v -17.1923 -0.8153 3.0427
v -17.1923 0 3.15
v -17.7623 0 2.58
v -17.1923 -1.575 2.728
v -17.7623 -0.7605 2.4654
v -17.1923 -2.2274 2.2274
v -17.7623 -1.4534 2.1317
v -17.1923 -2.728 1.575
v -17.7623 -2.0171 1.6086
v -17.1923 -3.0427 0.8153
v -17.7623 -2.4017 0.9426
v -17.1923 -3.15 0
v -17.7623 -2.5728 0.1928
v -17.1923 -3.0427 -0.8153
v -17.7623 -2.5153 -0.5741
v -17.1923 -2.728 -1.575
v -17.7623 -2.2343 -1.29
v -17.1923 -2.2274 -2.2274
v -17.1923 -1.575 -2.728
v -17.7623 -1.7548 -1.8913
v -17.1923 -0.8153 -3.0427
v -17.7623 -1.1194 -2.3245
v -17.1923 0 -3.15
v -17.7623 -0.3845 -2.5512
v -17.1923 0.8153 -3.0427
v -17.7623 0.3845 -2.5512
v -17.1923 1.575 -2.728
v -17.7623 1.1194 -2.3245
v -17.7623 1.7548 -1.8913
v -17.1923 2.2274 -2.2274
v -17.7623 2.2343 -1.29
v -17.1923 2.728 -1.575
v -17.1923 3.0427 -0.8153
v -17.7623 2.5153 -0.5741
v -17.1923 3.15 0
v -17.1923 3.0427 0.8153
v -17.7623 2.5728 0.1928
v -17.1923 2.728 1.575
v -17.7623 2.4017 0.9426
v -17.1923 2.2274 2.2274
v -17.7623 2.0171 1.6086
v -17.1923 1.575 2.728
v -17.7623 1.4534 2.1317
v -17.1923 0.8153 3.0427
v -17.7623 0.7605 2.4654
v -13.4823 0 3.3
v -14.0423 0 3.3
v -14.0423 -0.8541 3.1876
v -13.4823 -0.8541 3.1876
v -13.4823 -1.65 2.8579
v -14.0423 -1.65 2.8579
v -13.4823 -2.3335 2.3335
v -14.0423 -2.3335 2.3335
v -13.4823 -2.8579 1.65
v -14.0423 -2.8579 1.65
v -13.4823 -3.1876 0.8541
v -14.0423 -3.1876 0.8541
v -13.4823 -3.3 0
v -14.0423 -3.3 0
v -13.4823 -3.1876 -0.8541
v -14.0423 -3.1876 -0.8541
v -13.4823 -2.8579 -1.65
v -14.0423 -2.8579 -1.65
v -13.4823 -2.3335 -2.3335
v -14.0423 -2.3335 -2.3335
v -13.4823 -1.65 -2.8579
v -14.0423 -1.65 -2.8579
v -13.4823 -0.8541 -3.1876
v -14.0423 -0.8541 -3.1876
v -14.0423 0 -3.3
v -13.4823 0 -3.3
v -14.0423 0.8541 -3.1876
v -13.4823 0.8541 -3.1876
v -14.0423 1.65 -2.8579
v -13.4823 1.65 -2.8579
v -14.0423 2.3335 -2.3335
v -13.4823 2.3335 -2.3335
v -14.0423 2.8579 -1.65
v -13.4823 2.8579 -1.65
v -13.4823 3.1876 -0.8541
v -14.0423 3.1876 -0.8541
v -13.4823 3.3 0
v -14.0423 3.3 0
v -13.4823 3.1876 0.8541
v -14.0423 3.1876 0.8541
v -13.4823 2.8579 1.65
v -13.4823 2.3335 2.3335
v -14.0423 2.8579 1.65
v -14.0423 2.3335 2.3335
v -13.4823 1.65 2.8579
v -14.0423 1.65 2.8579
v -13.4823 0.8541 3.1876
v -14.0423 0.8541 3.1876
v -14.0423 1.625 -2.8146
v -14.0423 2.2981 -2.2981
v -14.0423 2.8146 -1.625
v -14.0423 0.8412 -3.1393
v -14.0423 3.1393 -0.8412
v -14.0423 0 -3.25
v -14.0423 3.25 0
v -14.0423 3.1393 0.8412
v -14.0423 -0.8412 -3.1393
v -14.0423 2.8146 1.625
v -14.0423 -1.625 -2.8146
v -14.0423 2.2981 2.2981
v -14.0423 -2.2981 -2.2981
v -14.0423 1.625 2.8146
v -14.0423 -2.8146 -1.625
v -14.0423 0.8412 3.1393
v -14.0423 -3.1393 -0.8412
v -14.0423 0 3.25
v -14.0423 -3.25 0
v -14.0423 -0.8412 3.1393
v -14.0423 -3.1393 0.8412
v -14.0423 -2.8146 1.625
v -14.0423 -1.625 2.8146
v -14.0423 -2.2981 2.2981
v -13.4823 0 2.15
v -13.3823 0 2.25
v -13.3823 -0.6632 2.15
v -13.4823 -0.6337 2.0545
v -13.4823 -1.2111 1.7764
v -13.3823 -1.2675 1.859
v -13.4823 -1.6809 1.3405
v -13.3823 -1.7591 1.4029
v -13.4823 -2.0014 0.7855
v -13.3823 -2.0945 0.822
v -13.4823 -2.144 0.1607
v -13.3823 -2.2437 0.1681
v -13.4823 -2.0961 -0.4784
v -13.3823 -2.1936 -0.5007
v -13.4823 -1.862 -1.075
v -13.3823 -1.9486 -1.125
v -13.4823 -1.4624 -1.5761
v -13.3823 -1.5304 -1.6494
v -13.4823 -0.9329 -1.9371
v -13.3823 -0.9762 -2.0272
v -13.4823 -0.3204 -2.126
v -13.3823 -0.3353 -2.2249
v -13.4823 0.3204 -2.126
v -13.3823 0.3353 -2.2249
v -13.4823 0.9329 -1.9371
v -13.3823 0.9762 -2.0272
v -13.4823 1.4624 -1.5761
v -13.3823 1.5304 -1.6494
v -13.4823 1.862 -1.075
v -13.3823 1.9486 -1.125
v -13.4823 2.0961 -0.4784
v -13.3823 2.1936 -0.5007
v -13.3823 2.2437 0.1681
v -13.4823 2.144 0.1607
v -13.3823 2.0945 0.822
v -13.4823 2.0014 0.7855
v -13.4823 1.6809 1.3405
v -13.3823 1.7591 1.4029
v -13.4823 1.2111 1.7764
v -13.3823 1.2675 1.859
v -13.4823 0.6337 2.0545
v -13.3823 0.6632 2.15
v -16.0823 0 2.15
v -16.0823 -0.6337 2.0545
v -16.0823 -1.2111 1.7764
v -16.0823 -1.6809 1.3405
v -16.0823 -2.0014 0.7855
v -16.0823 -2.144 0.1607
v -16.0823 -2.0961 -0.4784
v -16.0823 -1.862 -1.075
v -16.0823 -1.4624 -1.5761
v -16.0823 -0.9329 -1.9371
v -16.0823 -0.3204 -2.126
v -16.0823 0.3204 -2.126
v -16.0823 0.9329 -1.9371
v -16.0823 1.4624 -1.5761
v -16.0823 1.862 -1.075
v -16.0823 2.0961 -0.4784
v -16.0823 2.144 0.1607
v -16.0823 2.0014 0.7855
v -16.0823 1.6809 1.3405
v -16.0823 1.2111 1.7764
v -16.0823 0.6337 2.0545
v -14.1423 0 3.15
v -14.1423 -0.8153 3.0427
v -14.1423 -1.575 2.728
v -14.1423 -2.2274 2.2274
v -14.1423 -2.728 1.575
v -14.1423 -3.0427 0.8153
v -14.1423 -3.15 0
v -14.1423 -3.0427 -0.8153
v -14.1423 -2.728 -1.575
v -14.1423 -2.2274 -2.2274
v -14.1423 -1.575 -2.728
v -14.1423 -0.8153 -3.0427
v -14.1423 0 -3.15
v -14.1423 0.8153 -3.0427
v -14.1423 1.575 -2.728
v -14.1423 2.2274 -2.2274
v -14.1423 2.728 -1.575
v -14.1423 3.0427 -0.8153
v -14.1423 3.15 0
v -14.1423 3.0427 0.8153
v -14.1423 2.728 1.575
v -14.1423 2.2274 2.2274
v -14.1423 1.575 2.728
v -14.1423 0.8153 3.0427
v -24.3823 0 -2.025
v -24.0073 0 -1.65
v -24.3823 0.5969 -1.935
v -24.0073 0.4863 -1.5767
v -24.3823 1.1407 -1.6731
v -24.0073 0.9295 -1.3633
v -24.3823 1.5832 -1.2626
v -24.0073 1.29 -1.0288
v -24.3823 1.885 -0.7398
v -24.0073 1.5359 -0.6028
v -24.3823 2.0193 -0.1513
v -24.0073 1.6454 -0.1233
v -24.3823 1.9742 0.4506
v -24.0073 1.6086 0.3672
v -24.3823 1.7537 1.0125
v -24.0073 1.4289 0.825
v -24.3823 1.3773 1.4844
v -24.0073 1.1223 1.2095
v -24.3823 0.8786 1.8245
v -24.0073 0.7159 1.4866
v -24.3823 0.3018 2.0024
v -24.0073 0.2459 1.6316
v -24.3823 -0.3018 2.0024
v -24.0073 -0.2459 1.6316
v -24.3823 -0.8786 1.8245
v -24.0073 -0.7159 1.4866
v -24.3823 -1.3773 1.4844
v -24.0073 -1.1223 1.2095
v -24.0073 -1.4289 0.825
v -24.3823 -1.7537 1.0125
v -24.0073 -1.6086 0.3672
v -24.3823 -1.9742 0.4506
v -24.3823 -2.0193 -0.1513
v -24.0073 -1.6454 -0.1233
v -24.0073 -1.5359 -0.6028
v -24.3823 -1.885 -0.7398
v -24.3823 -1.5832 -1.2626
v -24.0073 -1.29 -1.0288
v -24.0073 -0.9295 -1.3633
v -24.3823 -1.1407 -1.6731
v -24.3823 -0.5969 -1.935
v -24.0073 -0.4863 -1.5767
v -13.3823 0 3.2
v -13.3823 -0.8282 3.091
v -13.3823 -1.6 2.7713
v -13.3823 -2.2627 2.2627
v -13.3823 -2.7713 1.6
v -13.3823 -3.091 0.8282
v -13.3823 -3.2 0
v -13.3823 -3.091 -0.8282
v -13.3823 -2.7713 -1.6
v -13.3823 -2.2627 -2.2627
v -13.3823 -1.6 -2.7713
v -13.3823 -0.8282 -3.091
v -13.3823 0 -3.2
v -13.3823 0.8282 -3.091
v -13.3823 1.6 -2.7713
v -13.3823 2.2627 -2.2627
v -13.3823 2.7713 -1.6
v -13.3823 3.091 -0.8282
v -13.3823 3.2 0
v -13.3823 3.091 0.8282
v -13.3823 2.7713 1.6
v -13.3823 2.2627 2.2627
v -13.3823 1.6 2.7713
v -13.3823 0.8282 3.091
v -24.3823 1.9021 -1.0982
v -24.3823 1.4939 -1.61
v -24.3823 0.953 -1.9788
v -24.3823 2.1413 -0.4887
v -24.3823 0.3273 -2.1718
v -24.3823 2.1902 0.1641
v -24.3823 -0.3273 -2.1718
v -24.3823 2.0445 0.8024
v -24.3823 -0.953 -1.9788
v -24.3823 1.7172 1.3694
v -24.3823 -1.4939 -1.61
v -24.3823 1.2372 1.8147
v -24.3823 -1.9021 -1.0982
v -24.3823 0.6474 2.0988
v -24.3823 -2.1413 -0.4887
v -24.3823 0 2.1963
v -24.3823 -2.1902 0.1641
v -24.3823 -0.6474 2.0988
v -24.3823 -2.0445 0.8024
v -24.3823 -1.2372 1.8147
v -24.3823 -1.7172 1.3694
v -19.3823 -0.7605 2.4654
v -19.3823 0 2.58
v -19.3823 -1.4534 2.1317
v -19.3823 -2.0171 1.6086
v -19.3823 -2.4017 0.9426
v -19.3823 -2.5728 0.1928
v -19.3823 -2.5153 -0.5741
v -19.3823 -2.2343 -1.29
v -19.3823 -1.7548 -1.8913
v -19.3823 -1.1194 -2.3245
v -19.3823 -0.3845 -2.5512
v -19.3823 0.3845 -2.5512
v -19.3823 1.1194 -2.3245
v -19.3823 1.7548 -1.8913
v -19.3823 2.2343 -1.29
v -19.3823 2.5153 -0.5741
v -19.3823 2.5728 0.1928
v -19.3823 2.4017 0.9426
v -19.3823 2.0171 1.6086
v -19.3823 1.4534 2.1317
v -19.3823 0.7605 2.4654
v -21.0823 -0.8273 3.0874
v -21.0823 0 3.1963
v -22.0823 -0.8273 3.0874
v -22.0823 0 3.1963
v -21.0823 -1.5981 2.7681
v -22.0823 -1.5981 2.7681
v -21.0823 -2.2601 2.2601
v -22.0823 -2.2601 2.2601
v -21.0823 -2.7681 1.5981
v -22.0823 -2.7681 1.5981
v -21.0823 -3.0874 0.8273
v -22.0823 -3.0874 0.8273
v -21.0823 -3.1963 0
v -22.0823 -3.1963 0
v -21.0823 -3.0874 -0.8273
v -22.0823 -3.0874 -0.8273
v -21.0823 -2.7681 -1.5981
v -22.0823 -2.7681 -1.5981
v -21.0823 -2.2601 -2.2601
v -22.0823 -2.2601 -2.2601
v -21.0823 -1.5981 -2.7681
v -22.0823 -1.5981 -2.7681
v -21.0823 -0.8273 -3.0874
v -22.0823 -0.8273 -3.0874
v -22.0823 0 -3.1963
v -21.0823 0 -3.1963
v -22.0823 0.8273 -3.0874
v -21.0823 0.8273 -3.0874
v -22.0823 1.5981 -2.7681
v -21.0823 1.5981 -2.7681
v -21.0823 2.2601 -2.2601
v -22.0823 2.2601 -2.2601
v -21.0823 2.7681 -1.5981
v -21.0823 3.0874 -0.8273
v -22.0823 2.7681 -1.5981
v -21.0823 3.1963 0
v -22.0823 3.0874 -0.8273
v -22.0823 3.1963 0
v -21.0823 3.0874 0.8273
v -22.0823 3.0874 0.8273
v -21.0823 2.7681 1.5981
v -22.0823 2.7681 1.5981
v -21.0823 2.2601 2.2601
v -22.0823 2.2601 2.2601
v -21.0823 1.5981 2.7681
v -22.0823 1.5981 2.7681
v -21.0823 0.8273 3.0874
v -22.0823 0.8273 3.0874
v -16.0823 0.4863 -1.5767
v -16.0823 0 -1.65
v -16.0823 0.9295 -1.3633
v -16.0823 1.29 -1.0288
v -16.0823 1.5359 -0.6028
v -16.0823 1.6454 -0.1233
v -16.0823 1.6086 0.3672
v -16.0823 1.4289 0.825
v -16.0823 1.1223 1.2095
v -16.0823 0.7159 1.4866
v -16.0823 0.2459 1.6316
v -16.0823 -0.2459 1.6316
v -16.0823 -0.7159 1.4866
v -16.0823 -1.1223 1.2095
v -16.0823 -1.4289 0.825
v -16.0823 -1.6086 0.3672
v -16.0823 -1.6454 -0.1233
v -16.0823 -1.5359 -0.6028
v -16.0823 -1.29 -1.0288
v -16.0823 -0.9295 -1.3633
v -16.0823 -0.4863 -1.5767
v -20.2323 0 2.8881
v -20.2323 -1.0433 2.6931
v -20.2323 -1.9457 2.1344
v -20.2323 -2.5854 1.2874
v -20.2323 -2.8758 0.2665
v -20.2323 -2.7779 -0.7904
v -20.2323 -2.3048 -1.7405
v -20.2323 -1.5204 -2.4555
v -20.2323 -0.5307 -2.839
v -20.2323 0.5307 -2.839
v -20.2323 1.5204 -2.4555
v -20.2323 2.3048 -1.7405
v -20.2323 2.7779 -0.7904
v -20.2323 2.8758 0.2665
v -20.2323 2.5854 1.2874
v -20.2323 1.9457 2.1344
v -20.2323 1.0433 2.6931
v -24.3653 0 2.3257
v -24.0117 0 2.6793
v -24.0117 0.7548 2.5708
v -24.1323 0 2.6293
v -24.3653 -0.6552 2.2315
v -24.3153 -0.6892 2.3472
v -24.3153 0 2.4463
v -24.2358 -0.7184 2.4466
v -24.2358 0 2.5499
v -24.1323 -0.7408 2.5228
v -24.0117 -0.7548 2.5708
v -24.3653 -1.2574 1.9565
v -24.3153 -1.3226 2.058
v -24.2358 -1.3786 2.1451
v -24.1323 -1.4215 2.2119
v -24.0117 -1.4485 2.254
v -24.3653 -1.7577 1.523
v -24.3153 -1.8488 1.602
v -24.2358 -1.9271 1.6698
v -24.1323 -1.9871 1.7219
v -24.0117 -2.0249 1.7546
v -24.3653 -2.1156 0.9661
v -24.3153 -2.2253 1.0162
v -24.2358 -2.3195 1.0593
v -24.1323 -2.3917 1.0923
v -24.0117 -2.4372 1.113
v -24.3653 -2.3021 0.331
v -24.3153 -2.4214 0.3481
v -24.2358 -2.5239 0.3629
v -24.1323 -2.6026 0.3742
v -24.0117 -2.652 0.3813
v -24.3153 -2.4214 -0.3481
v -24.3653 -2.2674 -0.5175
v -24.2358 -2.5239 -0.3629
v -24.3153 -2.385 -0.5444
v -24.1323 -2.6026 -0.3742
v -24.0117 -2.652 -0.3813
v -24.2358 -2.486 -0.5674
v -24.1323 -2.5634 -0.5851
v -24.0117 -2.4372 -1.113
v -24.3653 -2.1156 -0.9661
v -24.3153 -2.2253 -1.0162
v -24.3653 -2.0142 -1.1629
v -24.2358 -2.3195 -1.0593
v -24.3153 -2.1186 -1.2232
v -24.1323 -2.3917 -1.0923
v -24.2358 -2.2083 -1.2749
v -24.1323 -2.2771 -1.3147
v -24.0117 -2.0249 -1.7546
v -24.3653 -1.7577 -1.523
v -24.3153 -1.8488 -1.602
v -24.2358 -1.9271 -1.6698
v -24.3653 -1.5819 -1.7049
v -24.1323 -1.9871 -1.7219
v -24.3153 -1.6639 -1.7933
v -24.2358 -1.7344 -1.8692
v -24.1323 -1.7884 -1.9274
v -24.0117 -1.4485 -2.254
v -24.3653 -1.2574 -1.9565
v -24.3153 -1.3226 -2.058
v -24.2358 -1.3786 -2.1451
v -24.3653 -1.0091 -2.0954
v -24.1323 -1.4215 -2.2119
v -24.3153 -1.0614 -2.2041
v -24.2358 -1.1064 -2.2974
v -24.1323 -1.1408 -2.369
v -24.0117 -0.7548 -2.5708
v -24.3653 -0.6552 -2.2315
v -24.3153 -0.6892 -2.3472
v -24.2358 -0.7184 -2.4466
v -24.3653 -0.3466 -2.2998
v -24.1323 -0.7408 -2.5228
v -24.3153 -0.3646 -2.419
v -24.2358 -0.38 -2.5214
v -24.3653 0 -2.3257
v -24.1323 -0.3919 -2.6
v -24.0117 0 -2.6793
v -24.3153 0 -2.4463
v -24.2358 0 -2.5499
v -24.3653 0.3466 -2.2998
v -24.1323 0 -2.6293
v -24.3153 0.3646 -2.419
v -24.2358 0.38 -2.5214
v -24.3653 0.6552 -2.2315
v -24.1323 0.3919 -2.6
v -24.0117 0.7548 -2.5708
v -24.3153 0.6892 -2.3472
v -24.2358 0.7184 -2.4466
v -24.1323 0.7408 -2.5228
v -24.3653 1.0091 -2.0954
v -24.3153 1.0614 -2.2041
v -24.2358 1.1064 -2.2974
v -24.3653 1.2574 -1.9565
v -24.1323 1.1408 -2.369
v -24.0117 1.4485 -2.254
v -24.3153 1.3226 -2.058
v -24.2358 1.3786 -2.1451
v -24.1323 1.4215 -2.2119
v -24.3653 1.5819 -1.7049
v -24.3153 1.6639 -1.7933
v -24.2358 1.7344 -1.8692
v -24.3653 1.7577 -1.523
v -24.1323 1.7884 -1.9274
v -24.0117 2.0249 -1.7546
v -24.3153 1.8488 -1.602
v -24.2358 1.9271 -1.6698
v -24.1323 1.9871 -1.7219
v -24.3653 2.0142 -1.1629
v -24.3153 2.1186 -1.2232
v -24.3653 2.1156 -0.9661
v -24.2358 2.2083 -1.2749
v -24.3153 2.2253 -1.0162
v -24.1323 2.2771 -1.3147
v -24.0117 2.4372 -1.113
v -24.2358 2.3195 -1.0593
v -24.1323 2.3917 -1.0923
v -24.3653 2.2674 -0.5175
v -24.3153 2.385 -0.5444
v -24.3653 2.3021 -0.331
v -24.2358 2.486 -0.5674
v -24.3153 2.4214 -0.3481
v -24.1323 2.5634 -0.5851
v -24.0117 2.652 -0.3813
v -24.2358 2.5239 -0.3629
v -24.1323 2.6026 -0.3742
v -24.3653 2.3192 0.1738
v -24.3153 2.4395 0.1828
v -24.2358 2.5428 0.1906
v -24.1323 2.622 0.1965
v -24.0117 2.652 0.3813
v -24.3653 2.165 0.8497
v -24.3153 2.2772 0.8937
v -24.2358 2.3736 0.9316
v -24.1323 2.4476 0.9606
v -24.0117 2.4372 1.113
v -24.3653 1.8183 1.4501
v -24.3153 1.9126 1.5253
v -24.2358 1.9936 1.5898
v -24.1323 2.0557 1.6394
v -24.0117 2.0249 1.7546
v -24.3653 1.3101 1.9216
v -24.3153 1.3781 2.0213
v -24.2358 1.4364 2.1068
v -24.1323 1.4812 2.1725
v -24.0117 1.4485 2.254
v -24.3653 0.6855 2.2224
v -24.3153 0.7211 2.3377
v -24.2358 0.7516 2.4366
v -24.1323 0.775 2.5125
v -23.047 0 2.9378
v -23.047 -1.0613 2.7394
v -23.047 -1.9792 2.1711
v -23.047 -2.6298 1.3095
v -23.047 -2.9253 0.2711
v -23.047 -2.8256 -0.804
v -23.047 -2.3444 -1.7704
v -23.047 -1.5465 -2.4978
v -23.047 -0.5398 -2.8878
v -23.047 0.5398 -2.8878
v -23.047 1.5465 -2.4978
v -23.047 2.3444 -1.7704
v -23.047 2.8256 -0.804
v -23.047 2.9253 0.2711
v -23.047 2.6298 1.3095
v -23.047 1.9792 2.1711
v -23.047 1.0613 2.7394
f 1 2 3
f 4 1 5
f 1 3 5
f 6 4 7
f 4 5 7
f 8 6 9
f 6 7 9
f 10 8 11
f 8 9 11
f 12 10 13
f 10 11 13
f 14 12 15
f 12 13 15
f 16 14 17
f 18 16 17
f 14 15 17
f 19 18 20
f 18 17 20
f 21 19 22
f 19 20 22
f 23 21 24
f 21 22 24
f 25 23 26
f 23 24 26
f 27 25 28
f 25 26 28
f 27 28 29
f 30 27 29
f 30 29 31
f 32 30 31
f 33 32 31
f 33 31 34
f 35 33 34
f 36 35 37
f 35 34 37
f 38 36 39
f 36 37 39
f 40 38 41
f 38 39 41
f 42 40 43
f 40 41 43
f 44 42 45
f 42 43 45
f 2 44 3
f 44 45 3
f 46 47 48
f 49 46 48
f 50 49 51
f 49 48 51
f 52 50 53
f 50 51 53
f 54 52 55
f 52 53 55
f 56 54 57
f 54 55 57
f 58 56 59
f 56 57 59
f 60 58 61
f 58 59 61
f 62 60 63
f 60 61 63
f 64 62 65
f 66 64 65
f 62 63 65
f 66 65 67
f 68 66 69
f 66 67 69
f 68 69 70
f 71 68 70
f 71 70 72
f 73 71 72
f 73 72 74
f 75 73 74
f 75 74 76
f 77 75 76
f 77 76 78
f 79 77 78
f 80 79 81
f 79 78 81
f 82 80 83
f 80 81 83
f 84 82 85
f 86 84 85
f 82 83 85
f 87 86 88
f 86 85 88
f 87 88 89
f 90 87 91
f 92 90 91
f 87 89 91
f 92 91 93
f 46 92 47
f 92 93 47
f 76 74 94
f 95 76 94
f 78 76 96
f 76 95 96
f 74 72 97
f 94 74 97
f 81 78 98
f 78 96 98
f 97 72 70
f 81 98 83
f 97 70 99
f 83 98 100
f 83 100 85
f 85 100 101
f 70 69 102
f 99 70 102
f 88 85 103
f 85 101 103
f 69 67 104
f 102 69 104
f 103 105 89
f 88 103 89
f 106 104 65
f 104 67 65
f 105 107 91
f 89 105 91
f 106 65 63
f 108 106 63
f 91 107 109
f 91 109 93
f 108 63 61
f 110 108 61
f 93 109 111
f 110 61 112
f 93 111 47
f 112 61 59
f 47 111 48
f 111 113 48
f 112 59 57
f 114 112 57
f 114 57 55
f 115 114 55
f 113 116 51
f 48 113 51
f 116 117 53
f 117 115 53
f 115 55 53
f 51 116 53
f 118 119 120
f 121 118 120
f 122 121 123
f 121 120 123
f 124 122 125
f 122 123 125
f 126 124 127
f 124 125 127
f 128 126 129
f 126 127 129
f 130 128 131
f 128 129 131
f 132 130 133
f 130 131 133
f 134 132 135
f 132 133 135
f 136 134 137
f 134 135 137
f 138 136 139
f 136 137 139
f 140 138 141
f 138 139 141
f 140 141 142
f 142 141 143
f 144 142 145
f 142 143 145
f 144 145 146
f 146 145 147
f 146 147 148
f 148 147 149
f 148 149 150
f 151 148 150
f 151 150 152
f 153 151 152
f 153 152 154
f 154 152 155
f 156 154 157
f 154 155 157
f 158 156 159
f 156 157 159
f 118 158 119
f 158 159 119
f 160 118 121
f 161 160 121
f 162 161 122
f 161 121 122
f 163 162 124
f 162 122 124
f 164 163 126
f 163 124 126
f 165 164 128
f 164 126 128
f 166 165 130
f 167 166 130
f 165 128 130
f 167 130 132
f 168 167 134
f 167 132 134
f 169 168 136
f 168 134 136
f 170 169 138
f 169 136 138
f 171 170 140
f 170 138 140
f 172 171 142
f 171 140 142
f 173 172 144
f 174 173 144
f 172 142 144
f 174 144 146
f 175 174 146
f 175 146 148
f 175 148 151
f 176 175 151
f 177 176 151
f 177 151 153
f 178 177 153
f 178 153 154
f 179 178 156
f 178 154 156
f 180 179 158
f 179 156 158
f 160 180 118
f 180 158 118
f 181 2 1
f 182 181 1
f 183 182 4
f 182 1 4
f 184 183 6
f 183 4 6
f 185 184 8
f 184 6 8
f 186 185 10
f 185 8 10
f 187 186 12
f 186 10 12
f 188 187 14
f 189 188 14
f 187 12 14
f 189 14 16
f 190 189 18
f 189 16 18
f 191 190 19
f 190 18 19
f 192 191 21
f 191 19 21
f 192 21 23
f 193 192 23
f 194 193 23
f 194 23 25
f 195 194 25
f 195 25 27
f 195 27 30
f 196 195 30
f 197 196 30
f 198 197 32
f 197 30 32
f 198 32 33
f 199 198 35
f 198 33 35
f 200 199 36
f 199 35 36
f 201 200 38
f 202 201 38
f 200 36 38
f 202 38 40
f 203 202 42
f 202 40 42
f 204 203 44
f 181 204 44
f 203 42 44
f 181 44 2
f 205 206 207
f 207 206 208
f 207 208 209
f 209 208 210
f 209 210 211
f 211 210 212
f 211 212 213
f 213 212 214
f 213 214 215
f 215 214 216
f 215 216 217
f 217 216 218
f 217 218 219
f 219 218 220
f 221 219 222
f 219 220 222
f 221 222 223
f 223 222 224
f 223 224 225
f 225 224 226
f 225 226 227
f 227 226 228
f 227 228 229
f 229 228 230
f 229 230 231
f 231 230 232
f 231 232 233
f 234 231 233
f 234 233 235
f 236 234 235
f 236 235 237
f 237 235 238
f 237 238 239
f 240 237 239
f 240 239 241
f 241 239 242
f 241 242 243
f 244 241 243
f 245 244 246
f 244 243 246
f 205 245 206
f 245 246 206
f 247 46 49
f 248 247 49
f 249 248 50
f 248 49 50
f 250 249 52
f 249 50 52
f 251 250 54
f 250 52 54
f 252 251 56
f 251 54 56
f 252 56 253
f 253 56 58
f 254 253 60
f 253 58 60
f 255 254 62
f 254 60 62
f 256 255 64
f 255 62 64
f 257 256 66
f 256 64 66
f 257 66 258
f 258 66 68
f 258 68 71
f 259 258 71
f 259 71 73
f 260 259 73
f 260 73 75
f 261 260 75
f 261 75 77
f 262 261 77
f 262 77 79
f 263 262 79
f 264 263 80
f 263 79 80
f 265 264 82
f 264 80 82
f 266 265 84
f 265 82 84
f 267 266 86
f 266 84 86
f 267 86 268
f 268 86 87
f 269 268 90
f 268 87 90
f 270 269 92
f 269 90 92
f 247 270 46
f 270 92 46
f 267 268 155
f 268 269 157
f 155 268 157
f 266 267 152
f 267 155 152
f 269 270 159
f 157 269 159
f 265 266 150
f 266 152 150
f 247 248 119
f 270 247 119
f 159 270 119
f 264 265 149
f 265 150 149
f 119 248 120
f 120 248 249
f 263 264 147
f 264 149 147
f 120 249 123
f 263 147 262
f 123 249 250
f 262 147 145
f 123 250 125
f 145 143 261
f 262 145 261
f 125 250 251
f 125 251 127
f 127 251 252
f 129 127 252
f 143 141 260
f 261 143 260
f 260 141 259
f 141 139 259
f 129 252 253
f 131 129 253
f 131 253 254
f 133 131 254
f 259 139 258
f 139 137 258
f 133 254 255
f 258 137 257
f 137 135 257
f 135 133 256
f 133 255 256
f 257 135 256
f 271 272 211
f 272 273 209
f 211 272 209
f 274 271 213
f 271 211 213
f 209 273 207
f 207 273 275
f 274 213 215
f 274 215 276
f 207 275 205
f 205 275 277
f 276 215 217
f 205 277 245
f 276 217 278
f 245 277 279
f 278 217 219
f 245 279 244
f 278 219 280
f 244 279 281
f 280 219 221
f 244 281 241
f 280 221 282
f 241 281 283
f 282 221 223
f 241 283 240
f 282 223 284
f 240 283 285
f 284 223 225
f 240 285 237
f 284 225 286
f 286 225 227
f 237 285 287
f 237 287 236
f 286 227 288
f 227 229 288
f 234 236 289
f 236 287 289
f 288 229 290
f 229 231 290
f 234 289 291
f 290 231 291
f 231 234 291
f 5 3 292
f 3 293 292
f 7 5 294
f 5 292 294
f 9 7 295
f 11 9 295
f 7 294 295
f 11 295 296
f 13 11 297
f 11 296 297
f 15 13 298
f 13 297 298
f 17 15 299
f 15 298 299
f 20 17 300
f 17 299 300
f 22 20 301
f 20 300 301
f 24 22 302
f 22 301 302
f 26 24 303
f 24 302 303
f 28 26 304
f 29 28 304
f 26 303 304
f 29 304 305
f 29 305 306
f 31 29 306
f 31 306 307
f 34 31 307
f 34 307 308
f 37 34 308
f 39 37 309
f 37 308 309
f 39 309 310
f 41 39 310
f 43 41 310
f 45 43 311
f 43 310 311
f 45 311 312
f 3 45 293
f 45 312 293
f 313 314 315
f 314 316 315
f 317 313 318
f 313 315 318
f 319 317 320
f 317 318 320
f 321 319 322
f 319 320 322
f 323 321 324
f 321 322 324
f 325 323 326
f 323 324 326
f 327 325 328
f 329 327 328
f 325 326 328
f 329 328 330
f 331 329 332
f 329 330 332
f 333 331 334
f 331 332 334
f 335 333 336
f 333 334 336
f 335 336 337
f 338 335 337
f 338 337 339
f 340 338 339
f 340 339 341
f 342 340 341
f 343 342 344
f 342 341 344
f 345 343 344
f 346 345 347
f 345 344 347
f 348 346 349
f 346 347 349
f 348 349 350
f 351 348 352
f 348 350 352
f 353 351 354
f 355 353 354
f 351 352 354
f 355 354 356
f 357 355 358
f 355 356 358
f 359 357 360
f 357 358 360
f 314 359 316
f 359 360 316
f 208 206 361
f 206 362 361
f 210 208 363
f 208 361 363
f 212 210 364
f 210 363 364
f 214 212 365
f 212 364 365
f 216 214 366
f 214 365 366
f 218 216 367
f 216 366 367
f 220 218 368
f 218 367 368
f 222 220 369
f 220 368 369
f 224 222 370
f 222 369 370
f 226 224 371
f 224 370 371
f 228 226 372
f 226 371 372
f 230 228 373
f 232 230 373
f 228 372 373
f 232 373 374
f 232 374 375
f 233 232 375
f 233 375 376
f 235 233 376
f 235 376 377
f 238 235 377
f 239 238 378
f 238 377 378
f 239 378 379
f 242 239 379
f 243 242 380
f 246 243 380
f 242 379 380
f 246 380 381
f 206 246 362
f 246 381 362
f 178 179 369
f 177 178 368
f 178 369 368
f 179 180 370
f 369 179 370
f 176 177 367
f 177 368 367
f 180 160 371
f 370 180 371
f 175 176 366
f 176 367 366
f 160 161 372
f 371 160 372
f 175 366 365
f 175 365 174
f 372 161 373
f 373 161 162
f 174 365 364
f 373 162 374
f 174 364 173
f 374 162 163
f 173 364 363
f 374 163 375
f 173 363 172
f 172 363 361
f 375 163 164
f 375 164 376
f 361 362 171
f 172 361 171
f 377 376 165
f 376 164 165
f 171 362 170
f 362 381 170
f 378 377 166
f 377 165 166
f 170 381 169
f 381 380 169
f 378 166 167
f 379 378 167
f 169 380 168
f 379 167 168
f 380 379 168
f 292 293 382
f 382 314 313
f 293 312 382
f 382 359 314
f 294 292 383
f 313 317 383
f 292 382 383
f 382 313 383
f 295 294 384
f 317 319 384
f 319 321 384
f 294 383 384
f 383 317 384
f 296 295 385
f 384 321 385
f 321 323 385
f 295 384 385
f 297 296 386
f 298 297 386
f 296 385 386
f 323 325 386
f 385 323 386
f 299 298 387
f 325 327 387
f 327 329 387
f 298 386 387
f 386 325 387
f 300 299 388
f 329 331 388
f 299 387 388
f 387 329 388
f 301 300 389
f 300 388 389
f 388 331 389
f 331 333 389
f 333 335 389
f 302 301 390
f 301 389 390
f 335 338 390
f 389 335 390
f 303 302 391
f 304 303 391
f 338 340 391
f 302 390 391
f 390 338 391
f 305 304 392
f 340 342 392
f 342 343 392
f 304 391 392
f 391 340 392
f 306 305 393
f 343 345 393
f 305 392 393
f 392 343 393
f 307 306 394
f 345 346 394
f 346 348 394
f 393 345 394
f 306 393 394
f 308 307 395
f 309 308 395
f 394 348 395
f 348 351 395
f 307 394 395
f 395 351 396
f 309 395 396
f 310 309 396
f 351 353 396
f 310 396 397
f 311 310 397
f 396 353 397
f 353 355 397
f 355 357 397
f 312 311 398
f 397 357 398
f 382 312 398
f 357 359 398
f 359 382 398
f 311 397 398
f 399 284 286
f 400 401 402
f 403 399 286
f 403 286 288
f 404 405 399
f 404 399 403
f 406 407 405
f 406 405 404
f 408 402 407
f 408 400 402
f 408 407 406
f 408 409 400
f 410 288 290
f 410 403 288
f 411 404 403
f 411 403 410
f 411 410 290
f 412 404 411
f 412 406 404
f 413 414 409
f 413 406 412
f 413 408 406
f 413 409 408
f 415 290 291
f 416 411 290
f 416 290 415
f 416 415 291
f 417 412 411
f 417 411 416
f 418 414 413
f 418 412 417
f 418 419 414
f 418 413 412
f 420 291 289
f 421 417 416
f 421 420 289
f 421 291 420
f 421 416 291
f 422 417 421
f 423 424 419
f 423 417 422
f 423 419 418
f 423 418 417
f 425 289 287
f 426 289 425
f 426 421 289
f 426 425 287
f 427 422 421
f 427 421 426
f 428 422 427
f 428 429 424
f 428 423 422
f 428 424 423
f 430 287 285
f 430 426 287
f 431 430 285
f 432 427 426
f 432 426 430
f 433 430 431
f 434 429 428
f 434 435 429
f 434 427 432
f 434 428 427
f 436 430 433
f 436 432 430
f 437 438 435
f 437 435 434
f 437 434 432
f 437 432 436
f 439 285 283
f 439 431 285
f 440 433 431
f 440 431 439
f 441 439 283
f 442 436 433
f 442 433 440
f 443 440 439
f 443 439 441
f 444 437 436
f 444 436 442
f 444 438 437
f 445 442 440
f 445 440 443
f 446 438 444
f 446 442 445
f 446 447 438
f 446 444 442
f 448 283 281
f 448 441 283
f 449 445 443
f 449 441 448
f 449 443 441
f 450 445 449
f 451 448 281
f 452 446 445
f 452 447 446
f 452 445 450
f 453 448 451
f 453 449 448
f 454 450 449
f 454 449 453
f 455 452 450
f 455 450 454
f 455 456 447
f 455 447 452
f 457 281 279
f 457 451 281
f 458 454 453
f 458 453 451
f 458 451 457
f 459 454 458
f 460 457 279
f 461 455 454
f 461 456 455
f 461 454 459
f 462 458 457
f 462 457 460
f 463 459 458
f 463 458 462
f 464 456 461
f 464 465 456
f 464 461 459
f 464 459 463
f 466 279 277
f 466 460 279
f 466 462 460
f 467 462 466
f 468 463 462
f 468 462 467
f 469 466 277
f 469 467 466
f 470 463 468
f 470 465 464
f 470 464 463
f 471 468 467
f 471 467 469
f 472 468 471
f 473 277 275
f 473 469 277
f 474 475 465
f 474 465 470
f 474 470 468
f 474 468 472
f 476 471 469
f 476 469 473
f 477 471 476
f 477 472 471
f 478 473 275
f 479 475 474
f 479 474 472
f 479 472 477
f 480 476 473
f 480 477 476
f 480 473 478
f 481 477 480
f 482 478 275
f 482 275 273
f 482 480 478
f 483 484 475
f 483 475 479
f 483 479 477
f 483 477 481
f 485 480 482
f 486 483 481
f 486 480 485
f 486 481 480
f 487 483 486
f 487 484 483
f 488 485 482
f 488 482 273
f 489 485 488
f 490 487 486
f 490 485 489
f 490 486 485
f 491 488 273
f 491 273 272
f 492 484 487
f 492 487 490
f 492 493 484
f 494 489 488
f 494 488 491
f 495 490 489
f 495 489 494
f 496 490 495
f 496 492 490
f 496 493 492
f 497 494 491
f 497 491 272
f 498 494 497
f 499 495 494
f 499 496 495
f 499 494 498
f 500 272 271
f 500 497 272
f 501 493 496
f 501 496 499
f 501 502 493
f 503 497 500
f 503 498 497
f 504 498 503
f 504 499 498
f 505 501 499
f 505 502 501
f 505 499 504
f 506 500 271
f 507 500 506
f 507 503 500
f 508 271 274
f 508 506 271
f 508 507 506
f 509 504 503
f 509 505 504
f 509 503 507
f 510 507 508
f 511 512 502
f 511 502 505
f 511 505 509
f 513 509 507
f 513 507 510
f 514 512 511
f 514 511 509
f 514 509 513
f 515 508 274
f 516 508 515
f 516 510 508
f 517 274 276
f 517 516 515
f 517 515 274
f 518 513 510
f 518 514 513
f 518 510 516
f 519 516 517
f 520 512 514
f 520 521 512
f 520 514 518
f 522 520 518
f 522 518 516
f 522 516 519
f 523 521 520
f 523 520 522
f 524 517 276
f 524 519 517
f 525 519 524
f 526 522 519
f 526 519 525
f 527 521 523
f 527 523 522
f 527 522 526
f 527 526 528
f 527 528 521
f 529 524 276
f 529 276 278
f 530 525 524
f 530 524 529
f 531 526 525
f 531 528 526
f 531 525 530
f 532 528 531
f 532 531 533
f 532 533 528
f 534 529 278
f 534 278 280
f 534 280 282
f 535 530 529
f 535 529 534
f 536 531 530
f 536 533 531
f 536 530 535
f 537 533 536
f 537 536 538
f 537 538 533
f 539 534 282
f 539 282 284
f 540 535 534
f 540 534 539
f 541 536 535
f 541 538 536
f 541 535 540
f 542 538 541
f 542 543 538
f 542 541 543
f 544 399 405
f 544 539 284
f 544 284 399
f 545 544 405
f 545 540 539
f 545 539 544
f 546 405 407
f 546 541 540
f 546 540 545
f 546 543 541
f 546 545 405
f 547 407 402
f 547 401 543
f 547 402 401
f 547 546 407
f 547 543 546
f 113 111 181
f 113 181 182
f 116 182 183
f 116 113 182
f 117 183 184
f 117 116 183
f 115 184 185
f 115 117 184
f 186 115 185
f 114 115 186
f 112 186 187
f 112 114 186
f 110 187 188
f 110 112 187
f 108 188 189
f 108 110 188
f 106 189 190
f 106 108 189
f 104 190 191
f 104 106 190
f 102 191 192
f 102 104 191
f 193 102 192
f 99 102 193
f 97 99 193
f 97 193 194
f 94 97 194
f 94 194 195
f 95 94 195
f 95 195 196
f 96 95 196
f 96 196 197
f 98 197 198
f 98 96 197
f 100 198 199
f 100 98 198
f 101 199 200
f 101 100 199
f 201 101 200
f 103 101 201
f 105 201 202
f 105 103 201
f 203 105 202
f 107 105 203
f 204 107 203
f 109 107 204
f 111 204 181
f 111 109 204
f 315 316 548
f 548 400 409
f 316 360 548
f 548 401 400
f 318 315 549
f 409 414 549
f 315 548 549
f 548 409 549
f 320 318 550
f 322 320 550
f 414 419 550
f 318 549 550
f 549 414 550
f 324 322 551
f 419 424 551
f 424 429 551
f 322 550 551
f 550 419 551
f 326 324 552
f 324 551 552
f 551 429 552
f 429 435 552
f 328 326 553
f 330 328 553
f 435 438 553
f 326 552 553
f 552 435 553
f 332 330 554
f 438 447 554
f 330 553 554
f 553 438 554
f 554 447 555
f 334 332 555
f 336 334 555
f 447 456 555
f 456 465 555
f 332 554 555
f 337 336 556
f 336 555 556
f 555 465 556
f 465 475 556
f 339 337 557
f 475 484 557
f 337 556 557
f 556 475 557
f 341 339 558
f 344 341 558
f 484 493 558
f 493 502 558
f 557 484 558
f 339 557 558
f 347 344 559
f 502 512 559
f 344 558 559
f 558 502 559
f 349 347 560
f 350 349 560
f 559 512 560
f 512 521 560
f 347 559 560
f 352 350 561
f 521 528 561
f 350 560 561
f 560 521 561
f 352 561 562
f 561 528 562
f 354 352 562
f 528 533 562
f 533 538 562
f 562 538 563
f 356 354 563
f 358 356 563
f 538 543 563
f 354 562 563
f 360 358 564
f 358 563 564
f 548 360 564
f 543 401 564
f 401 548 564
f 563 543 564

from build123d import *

# Parameters (mm, degrees)
M4_TAPPED_HOLE1_D           = 3.3
M4_TAPPED_HOLE1_CSINK_D     = 4.05
M4_TAPPED_HOLE1_CSINK_ANGLE = 90
FILLET3_R                   = 0.5
CHAMFER1_SIZE               = 0.1


with BuildPart() as part:
    # Sketch2 → Revolve1 (revolve)
    with BuildSketch(Plane.XY, mode=Mode.PRIVATE) as revolve1_sk:
        Polygon((-24.382296362, 0), (-17.415327427, 0), (-16.082296362, 0), (-16.082296362, 2.15), (-13.382296362, 2.15), (-13.382296362, 3.3), (-14.042296362, 3.3), (-14.042296362, 3.15), (-17.192296362, 3.15), (-17.762296362, 2.58), (-19.382296362, 2.58), (-21.082296362, 3.196283143), (-22.082296362, 3.196283143), (-24.382296362, 2.58), align=None)
    revolve(revolve1_sk.sketch.rotate(Axis((-24.382296362, 0, 0), (1, 0, 0)), 90), axis=Axis((-24.382296362, 0, 0), (1, 0, 0)))

    # M4 Tapped Hole1 (through all)
    with Locations(Plane.ZY.offset(24.382296362)):
        with Locations((0, 0)):
            CounterSinkHole(M4_TAPPED_HOLE1_D / 2, M4_TAPPED_HOLE1_CSINK_D / 2, counter_sink_angle=M4_TAPPED_HOLE1_CSINK_ANGLE)

    # Fillet3
    fillet3_edges = [part.edges().sort_by_distance(p)[0] for p in [
        (-24.382296362, 0, -2.58),
    ]]
    fillet(fillet3_edges, radius=FILLET3_R)

    # Chamfer1
    chamfer1_edges = [part.edges().sort_by_distance(p)[0] for p in [
        (-13.382296362, 0, -2.15),
        (-13.382296362, 0, -3.3),
        (-14.042296362, 0, -3.15),
    ]]
    chamfer(chamfer1_edges, length=CHAMFER1_SIZE)


solid = part.part
